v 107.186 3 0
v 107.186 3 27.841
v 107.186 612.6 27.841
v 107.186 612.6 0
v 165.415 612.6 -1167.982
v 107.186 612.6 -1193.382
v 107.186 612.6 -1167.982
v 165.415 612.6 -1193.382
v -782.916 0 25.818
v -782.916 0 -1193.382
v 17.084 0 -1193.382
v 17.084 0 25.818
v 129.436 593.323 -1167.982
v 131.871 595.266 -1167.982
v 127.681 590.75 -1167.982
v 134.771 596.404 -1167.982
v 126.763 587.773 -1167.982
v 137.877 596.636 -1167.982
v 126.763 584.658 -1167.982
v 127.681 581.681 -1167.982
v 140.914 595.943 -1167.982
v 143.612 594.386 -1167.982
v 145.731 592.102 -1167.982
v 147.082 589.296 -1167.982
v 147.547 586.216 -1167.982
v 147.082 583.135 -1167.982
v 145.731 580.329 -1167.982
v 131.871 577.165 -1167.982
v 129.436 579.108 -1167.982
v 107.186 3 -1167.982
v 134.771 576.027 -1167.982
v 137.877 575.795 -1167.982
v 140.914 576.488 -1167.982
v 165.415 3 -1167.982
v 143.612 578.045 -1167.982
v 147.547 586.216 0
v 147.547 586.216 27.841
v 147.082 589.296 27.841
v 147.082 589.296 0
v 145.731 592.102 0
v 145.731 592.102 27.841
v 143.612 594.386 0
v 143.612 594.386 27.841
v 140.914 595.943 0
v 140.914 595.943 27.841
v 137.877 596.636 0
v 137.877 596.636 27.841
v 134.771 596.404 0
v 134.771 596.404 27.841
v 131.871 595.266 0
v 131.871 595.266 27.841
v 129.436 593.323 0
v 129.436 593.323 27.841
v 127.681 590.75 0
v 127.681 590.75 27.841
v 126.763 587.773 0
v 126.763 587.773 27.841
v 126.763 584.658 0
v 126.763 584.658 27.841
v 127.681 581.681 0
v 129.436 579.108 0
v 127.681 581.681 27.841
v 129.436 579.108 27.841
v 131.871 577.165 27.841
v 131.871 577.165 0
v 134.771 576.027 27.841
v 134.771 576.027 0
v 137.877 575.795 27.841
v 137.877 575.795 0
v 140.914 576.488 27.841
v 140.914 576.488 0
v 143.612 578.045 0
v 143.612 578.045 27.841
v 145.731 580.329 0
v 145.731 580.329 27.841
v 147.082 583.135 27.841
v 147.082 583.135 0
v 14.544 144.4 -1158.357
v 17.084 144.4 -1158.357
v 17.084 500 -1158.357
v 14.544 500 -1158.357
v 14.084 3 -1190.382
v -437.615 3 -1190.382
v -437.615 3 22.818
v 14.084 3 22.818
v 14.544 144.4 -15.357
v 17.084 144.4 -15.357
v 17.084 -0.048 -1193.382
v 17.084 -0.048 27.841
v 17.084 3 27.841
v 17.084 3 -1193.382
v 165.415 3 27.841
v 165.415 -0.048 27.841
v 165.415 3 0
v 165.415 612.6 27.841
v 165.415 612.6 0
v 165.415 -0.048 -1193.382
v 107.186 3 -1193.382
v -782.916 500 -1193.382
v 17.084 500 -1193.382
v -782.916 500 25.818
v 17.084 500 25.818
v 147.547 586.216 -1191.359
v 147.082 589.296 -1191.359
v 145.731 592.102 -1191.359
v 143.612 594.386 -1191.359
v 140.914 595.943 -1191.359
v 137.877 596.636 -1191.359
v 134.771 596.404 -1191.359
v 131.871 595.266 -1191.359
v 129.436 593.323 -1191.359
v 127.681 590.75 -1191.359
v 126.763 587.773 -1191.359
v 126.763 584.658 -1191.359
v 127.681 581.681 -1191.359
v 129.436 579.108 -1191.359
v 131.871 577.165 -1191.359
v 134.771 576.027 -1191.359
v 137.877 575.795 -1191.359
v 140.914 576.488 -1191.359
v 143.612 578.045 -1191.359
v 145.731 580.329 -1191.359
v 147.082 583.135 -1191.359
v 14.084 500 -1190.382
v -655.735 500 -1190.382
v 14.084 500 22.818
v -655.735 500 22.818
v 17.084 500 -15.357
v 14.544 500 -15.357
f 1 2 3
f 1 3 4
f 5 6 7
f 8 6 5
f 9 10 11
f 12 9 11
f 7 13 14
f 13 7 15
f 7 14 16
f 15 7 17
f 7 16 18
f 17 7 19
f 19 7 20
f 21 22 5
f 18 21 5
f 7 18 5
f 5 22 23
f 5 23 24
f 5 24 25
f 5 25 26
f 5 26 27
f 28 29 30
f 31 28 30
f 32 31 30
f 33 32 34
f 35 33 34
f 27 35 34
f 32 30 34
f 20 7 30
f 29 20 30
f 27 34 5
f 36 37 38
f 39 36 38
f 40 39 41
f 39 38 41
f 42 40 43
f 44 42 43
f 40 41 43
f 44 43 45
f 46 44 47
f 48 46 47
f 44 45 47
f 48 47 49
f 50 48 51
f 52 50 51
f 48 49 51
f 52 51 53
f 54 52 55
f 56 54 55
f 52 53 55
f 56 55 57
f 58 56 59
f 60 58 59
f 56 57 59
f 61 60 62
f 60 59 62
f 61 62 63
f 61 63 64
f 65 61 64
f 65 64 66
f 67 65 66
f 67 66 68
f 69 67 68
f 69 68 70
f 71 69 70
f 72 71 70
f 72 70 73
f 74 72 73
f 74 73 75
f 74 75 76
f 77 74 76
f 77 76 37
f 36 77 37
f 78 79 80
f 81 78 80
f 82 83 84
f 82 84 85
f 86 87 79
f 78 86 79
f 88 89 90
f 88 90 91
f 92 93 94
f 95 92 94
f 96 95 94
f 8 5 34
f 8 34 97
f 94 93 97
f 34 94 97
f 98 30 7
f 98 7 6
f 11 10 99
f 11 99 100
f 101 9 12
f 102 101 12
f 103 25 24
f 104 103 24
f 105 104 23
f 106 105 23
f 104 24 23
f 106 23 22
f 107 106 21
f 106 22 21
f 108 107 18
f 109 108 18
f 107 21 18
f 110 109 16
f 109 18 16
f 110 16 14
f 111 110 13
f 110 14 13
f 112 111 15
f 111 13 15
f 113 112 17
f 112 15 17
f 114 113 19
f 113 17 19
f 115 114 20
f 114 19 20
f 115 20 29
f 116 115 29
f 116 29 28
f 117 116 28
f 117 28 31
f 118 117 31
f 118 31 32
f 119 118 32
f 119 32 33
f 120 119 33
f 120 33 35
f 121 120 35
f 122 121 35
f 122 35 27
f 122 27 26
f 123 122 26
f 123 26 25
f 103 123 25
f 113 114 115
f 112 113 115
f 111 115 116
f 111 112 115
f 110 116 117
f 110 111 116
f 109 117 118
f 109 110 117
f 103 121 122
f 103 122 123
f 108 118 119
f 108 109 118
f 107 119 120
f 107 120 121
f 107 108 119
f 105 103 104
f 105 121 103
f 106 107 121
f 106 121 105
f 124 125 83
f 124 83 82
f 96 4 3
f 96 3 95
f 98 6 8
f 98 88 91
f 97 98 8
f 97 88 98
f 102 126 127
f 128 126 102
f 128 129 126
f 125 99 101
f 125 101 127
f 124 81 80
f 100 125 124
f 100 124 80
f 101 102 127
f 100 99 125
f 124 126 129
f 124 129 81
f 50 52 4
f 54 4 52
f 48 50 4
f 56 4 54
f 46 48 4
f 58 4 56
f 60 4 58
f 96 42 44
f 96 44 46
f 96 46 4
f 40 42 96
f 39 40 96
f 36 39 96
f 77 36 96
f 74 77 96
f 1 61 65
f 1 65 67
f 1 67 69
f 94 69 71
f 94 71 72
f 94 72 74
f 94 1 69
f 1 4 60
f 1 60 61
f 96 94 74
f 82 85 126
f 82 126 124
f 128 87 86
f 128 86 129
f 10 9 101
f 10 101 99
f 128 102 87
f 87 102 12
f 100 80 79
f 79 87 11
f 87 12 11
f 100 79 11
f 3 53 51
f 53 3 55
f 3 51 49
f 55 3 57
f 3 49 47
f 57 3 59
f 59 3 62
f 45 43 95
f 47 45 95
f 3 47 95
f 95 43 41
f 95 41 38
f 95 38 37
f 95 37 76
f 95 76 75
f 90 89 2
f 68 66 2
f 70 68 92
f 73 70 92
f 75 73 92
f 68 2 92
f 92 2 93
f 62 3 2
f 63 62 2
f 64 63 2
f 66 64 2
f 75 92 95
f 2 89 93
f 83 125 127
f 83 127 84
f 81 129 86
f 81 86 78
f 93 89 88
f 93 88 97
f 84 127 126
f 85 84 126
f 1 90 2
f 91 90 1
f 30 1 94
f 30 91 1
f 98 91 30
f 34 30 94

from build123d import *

# Parameters (mm, degrees)
SKETCH1_W                = 800
SKETCH1_H                = 1219.2
BOSS_EXTRUDE1_DEPTH      = 500
SHELL1_T                 = -3
SKETCH5_W                = 1143
SKETCH5_H                = 355.6
CUT_EXTRUDE2_DEPTH       = 2.54
BOSS_EXTRUDE3_DEPTH      = 1219.2
BOSS_EXTRUDE4_DEPTH      = 0.00010033
BOSS_EXTRUDE4_DEPTH_BACK = 3.048
SKETCH7_W                = 148.331634326
SKETCH7_H                = 1221.222643636
SKETCH8_W                = 58.228968179
SKETCH8_H                = 25.4
SKETCH8_H_2              = 27.840540907
BOSS_EXTRUDE5_DEPTH      = 609.6
SKETCH9_R                = 10.450146839
CUT_EXTRUDE3_DEPTH       = 1219.2


with BuildPart() as part:
    # Sketch1 → Boss-Extrude1 (new body)
    with BuildSketch(Plane(origin=(0, 0, 0), x_dir=(1, 0, 0), z_dir=(0, 1, 0))):
        with Locations((-382.91637622, 583.782102729)):
            Rectangle(SKETCH1_W, SKETCH1_H)
    extrude(amount=BOSS_EXTRUDE1_DEPTH)

    # Shell1
    shell1_openings = [part.faces().sort_by_distance(p)[0] for p in [
        (-382.91637622, 500, -583.782102729),
    ]]
    offset(amount=SHELL1_T, openings=shell1_openings, kind=Kind.INTERSECTION)

    # Sketch5 → Cut-Extrude2 (cut)
    with BuildSketch(Plane(origin=(17.08362378, 0, 0), x_dir=(0, 0, -1), z_dir=(1, 0, 0))):
        with Locations((586.856873248, 322.2)):
            Rectangle(SKETCH5_W, SKETCH5_H)
    extrude(amount=-CUT_EXTRUDE2_DEPTH, mode=Mode.SUBTRACT)

    # Sketch6 → Boss-Extrude3 (add)
    with BuildSketch(Plane.XY.offset(25.817897271)):
        Polygon((-436.298693774, 0), (-782.91637622, 0), (-782.91637622, 500), (-655.734510297, 500), align=None)
    extrude(amount=-BOSS_EXTRUDE3_DEPTH)


with BuildPart() as body_2:
    # Sketch7 → Boss-Extrude4 (new, two sides: drawn at the far end of the back side and taken through both)
    with BuildSketch(Plane(origin=(0, 3, 0), x_dir=(1, 0, 0), z_dir=(0, 1, 0)).offset(-BOSS_EXTRUDE4_DEPTH_BACK)):
        with Locations((91.249440943, 582.770780911)):
            Rectangle(SKETCH7_W, SKETCH7_H)
    extrude(amount=BOSS_EXTRUDE4_DEPTH + BOSS_EXTRUDE4_DEPTH_BACK)

    # Sketch8 → Boss-Extrude5 (add)
    with BuildSketch(Plane(origin=(0, 3.00010033, 0), x_dir=(1, 0, 0), z_dir=(0, 1, 0))):
        with Locations((136.300774017, 1180.682102729)):
            Rectangle(SKETCH8_W, SKETCH8_H)
        with Locations((136.300774017, -13.920270454)):
            Rectangle(SKETCH8_W, SKETCH8_H_2)
    extrude(amount=BOSS_EXTRUDE5_DEPTH)

    # Sketch9 → Cut-Extrude3 (cut)
    with BuildSketch(Plane.XY.offset(27.840540907)):
        with Locations((137.096355472, 586.215569874)):
            Circle(SKETCH9_R)
    extrude(amount=-CUT_EXTRUDE3_DEPTH, mode=Mode.SUBTRACT)


solid = Compound([part.part, body_2.part])
